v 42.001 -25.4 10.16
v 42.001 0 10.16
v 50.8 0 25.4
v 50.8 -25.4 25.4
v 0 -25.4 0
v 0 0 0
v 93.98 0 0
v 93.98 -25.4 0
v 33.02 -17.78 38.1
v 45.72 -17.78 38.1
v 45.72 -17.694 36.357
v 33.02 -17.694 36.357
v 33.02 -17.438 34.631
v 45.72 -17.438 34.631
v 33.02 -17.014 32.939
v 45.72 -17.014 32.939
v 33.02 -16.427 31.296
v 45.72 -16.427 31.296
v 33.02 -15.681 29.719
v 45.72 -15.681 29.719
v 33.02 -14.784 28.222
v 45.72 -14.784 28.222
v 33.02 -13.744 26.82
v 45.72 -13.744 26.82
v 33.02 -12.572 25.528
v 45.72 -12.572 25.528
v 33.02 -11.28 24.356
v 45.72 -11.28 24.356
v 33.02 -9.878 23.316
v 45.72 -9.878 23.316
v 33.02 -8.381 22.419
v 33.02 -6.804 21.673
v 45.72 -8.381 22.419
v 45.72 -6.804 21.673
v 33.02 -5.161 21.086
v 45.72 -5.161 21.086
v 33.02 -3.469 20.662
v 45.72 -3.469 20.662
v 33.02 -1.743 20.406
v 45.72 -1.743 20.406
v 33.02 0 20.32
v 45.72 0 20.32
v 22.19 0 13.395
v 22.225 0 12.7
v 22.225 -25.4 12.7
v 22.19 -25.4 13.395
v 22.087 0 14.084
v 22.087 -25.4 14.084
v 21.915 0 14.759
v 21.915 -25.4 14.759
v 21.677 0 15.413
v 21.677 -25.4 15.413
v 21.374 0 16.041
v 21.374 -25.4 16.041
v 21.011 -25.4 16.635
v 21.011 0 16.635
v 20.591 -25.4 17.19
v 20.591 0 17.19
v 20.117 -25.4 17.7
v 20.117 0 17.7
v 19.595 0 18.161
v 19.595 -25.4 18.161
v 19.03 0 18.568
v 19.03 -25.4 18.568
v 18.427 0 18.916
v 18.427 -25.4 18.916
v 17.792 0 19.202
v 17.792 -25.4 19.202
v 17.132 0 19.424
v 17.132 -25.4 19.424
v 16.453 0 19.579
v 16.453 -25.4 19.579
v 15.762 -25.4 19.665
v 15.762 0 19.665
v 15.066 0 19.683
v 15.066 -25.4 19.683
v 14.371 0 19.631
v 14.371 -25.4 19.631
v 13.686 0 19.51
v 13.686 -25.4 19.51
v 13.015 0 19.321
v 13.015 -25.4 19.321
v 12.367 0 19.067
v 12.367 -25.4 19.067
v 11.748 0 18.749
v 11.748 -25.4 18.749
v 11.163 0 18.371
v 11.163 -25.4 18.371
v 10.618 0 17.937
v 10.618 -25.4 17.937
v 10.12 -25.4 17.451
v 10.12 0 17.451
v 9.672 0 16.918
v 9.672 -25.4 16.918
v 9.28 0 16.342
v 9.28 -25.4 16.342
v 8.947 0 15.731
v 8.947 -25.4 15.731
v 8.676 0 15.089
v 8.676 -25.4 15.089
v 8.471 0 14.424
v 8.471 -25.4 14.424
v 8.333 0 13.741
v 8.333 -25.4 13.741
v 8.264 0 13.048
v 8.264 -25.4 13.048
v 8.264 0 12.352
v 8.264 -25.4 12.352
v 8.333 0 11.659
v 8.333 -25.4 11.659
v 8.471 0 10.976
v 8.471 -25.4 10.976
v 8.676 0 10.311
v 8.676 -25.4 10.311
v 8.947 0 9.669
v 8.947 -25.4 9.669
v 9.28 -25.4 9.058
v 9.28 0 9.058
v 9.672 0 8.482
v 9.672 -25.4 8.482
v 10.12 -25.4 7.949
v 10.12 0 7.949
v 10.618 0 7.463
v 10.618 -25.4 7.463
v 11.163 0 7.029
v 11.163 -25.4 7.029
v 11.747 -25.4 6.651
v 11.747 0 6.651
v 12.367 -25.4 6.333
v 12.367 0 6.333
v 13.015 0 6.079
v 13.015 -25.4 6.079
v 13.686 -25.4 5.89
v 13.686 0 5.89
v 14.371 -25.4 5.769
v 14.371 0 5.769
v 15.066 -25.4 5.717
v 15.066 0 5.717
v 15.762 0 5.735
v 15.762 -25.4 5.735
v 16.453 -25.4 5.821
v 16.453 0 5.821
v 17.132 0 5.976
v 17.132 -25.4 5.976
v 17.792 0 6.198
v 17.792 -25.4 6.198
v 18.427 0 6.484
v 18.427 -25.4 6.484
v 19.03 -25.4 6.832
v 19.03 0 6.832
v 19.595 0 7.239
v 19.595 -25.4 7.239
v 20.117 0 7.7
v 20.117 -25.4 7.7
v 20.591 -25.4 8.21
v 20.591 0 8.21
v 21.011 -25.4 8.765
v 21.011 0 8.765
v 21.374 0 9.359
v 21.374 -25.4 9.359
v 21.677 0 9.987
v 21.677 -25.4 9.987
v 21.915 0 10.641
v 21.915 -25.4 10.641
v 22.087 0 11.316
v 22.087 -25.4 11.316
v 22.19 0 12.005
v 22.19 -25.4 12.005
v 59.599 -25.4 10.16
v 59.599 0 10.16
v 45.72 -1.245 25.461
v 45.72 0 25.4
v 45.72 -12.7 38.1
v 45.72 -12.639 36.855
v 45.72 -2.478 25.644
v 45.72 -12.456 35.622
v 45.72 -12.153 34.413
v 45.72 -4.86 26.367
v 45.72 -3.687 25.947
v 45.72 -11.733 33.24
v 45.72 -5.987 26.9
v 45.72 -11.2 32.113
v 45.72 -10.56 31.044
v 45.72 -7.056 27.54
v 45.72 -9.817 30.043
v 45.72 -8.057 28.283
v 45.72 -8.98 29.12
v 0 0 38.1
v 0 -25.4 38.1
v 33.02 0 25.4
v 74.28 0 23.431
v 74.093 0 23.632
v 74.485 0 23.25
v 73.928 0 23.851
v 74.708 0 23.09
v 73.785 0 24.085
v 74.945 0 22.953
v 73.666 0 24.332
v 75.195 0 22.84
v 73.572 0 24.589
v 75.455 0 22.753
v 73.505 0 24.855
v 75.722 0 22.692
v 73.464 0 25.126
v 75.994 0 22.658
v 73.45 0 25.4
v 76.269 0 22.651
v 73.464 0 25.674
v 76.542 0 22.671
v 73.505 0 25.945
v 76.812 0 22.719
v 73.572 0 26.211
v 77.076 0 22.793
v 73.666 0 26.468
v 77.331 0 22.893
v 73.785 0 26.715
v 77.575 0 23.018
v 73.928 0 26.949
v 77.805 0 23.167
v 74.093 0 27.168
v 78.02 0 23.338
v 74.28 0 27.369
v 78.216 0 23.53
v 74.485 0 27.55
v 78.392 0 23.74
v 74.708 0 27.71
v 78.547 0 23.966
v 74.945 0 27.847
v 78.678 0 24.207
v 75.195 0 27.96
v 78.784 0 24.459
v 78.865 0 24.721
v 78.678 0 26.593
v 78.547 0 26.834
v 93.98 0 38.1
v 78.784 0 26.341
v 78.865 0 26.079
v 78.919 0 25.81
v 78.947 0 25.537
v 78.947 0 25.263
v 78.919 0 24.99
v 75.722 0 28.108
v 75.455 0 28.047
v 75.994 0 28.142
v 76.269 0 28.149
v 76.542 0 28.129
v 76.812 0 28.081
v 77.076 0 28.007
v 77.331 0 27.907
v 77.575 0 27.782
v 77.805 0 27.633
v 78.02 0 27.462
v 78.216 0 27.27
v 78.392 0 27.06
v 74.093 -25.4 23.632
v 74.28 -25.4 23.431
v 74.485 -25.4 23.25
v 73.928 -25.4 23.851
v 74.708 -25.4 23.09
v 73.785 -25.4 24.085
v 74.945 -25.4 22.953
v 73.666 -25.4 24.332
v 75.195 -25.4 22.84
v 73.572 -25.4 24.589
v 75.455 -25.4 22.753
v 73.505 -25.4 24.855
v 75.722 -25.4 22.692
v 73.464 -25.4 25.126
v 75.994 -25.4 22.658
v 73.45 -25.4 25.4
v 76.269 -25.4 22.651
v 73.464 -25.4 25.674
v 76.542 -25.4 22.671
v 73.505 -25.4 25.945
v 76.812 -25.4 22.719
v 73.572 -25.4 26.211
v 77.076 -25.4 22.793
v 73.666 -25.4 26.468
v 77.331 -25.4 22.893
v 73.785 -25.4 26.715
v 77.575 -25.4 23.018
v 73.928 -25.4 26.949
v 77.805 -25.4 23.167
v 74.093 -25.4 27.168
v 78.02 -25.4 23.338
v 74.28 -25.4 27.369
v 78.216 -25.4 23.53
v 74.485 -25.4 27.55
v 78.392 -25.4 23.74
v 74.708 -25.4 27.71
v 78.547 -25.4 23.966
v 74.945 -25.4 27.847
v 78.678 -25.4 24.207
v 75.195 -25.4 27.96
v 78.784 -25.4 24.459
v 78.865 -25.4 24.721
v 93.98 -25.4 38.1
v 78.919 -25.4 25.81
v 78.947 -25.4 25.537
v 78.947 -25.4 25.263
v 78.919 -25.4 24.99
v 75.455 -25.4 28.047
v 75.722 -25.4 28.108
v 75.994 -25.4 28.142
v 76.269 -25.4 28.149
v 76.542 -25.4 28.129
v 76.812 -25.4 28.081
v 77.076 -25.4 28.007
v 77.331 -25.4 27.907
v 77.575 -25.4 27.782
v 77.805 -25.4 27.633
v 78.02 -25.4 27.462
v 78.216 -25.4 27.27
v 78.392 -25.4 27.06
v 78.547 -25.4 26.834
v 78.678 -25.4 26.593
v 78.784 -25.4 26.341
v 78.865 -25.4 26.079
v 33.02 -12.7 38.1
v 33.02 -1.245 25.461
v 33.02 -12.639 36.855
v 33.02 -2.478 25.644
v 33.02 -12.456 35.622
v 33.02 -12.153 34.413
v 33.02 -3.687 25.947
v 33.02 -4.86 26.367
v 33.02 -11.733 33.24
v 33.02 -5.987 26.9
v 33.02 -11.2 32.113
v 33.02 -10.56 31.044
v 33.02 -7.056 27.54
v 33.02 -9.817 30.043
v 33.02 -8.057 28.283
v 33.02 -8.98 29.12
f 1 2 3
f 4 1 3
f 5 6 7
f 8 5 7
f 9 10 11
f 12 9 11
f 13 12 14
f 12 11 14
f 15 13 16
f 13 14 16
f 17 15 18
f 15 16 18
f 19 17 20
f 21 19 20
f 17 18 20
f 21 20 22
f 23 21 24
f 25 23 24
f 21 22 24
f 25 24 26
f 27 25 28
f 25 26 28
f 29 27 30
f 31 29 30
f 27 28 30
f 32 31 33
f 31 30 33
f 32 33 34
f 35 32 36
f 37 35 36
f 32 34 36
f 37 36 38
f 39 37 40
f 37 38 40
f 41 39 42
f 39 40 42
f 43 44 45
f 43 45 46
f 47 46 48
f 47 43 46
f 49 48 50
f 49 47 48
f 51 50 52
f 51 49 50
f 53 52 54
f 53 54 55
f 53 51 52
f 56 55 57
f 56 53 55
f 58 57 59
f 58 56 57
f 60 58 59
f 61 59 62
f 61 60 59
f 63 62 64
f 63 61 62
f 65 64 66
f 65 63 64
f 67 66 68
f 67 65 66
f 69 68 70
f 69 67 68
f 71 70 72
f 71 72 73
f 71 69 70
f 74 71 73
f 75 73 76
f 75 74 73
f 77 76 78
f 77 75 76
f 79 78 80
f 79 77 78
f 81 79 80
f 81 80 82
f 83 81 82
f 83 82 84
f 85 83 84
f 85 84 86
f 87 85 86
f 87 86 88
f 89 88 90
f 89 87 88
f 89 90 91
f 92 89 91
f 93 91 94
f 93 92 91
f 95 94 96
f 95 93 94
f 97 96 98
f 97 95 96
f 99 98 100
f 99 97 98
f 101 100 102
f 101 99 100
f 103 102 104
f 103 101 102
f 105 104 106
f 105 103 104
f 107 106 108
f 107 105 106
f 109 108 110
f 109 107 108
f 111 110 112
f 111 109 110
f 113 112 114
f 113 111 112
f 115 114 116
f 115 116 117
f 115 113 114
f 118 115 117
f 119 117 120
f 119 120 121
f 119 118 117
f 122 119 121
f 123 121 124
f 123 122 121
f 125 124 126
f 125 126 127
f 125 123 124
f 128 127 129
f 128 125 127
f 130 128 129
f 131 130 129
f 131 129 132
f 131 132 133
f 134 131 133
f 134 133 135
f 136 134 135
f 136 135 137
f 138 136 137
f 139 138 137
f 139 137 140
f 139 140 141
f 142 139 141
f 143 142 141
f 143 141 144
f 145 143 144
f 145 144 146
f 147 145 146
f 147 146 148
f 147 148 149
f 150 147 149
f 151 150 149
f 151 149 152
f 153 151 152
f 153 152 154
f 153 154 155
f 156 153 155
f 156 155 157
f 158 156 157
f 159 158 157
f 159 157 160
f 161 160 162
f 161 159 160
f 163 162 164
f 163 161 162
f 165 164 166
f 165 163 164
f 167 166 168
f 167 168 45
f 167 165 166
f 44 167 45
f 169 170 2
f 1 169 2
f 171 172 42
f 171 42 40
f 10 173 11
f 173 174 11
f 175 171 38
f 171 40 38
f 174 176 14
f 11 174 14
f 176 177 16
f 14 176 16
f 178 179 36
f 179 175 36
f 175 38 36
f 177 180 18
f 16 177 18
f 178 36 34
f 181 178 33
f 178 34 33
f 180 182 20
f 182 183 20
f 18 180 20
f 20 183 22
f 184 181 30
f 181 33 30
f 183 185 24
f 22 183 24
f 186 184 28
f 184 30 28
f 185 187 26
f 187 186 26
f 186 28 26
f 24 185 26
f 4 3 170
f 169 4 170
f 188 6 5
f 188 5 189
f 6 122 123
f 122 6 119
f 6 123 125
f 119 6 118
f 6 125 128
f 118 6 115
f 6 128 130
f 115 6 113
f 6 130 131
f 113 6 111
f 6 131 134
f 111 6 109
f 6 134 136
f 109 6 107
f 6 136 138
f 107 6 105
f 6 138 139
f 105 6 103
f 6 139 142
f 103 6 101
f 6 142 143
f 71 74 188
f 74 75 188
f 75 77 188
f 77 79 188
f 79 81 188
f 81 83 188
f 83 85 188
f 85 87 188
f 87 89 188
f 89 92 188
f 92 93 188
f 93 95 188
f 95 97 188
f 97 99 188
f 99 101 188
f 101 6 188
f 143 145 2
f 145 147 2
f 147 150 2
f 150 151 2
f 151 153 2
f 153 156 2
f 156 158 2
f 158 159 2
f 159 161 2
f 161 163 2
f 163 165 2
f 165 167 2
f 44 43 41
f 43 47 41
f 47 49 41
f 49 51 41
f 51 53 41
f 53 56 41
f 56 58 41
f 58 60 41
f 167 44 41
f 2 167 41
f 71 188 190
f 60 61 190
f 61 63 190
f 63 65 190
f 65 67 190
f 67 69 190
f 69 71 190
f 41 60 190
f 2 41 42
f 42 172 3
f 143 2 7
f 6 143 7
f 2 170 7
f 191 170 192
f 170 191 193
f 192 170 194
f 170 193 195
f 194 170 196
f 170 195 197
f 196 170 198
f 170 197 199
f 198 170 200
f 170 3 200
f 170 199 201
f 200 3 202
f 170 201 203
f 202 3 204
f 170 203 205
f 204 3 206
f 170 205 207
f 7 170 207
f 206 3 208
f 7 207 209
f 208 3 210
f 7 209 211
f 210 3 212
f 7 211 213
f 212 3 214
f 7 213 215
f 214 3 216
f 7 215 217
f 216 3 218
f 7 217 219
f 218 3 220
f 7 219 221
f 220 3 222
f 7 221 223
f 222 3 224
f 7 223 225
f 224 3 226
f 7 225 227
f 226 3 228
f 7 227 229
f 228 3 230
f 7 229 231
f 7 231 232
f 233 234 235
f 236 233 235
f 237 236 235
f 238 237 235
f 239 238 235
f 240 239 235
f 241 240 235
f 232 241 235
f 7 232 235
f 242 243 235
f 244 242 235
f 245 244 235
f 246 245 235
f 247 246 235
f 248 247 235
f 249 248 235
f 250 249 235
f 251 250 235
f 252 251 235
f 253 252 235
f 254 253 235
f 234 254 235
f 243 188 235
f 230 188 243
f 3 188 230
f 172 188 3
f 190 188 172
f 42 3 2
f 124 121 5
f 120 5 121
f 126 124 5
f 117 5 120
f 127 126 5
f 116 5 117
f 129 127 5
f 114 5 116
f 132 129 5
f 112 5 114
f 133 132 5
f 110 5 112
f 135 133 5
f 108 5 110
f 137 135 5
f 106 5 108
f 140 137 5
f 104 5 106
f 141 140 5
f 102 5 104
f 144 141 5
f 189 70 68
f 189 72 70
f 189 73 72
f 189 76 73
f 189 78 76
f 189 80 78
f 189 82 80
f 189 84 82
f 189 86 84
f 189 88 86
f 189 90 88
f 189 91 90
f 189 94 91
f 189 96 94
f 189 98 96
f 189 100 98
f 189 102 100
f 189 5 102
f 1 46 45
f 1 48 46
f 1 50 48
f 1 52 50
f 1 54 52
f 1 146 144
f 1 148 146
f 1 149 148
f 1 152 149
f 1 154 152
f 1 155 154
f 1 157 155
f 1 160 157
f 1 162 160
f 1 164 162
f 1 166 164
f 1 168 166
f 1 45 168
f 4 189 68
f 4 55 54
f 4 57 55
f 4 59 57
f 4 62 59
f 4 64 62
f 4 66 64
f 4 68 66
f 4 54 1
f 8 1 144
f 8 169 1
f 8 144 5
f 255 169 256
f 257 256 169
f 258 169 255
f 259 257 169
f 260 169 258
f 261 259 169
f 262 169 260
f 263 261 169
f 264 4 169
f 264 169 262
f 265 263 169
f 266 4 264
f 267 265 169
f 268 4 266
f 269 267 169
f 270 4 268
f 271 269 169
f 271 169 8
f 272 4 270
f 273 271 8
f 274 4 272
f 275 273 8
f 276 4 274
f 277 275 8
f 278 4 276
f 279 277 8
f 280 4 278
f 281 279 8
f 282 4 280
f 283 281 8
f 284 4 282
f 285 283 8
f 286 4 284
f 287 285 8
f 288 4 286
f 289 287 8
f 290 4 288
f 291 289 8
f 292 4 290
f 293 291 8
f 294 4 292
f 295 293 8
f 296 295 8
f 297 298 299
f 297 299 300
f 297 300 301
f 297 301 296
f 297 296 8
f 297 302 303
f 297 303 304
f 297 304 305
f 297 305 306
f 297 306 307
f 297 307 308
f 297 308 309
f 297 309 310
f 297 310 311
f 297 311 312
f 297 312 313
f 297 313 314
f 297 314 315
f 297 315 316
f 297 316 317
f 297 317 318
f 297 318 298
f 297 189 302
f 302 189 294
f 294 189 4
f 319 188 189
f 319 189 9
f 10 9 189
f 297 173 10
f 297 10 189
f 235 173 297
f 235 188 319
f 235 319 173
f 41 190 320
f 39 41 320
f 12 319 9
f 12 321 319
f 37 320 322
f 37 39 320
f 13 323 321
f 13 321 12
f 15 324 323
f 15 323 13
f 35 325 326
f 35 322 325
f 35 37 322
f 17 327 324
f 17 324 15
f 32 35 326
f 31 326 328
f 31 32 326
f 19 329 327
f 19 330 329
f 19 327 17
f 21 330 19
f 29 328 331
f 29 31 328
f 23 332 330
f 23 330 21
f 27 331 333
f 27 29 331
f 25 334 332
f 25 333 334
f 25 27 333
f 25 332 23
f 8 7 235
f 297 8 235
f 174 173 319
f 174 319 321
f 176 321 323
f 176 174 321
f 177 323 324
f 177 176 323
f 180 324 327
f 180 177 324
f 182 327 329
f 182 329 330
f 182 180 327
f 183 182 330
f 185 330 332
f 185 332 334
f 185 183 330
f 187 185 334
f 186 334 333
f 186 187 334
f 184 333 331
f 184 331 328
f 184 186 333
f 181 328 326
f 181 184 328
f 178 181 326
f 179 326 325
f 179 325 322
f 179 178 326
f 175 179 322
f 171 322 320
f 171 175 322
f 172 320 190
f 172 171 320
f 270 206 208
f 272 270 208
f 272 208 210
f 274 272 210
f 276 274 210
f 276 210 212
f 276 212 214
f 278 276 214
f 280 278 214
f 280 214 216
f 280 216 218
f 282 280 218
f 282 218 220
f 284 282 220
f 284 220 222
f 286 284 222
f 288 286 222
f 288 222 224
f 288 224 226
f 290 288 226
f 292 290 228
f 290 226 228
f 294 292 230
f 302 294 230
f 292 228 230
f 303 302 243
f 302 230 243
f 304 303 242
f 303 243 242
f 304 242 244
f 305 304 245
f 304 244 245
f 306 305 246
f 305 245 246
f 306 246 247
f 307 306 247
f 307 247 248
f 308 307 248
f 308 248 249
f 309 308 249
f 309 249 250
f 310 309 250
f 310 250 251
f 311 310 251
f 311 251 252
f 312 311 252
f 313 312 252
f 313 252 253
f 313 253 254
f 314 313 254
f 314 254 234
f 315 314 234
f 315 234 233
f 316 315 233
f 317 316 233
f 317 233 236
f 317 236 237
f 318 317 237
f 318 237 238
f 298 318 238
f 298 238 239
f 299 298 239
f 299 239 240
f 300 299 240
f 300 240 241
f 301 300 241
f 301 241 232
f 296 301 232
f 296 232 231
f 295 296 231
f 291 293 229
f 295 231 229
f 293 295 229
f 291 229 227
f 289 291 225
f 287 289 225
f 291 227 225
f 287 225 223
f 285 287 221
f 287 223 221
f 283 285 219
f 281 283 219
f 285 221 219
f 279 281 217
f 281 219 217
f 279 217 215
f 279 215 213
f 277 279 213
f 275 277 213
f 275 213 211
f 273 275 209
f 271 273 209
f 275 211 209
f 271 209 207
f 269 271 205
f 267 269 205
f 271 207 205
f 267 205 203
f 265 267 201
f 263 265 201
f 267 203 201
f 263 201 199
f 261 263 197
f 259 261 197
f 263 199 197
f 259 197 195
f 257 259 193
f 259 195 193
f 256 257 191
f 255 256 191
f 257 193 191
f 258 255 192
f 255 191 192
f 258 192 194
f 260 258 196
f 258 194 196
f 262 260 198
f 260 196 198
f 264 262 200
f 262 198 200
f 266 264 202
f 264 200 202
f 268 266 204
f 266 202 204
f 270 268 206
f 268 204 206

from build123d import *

# Parameters (mm, degrees)
F0_W     = 93.98
F0_H     = 38.1
F0_R     = 6.985
F1_DEPTH = 25.4
F3_D     = 5.5
F4_W     = 12.7
F4_H     = 5.08


with BuildPart() as f1:
    # F0 (on Front) → F1 (new body)
    with BuildSketch(Plane.XZ):
        with Locations((46.99, 19.05)):
            Rectangle(F0_W, F0_H)
        with Locations((15.24, 12.7)):
            Circle(F0_R, mode=Mode.SUBTRACT)
        Polygon((42.0011818976, 10.16), (50.8, 25.4), (59.5988181024, 10.16), align=None, mode=Mode.SUBTRACT)
    extrude(amount=F1_DEPTH)

    # F3 (through all)
    with Locations(Plane.XZ.offset(25.4)):
        with Locations((76.2, 25.4)):
            Hole(F3_D / 2)

    # F4 (on face) → F5 (revolve, cut)
    with BuildSketch(Plane.XY.offset(38.1)):
        with Locations((39.37, -15.24)):
            Rectangle(F4_W, F4_H)
    revolve(axis=Axis((46.99, 0, 38.1), (1, 0, 0)), mode=Mode.SUBTRACT)


solid = f1.part
